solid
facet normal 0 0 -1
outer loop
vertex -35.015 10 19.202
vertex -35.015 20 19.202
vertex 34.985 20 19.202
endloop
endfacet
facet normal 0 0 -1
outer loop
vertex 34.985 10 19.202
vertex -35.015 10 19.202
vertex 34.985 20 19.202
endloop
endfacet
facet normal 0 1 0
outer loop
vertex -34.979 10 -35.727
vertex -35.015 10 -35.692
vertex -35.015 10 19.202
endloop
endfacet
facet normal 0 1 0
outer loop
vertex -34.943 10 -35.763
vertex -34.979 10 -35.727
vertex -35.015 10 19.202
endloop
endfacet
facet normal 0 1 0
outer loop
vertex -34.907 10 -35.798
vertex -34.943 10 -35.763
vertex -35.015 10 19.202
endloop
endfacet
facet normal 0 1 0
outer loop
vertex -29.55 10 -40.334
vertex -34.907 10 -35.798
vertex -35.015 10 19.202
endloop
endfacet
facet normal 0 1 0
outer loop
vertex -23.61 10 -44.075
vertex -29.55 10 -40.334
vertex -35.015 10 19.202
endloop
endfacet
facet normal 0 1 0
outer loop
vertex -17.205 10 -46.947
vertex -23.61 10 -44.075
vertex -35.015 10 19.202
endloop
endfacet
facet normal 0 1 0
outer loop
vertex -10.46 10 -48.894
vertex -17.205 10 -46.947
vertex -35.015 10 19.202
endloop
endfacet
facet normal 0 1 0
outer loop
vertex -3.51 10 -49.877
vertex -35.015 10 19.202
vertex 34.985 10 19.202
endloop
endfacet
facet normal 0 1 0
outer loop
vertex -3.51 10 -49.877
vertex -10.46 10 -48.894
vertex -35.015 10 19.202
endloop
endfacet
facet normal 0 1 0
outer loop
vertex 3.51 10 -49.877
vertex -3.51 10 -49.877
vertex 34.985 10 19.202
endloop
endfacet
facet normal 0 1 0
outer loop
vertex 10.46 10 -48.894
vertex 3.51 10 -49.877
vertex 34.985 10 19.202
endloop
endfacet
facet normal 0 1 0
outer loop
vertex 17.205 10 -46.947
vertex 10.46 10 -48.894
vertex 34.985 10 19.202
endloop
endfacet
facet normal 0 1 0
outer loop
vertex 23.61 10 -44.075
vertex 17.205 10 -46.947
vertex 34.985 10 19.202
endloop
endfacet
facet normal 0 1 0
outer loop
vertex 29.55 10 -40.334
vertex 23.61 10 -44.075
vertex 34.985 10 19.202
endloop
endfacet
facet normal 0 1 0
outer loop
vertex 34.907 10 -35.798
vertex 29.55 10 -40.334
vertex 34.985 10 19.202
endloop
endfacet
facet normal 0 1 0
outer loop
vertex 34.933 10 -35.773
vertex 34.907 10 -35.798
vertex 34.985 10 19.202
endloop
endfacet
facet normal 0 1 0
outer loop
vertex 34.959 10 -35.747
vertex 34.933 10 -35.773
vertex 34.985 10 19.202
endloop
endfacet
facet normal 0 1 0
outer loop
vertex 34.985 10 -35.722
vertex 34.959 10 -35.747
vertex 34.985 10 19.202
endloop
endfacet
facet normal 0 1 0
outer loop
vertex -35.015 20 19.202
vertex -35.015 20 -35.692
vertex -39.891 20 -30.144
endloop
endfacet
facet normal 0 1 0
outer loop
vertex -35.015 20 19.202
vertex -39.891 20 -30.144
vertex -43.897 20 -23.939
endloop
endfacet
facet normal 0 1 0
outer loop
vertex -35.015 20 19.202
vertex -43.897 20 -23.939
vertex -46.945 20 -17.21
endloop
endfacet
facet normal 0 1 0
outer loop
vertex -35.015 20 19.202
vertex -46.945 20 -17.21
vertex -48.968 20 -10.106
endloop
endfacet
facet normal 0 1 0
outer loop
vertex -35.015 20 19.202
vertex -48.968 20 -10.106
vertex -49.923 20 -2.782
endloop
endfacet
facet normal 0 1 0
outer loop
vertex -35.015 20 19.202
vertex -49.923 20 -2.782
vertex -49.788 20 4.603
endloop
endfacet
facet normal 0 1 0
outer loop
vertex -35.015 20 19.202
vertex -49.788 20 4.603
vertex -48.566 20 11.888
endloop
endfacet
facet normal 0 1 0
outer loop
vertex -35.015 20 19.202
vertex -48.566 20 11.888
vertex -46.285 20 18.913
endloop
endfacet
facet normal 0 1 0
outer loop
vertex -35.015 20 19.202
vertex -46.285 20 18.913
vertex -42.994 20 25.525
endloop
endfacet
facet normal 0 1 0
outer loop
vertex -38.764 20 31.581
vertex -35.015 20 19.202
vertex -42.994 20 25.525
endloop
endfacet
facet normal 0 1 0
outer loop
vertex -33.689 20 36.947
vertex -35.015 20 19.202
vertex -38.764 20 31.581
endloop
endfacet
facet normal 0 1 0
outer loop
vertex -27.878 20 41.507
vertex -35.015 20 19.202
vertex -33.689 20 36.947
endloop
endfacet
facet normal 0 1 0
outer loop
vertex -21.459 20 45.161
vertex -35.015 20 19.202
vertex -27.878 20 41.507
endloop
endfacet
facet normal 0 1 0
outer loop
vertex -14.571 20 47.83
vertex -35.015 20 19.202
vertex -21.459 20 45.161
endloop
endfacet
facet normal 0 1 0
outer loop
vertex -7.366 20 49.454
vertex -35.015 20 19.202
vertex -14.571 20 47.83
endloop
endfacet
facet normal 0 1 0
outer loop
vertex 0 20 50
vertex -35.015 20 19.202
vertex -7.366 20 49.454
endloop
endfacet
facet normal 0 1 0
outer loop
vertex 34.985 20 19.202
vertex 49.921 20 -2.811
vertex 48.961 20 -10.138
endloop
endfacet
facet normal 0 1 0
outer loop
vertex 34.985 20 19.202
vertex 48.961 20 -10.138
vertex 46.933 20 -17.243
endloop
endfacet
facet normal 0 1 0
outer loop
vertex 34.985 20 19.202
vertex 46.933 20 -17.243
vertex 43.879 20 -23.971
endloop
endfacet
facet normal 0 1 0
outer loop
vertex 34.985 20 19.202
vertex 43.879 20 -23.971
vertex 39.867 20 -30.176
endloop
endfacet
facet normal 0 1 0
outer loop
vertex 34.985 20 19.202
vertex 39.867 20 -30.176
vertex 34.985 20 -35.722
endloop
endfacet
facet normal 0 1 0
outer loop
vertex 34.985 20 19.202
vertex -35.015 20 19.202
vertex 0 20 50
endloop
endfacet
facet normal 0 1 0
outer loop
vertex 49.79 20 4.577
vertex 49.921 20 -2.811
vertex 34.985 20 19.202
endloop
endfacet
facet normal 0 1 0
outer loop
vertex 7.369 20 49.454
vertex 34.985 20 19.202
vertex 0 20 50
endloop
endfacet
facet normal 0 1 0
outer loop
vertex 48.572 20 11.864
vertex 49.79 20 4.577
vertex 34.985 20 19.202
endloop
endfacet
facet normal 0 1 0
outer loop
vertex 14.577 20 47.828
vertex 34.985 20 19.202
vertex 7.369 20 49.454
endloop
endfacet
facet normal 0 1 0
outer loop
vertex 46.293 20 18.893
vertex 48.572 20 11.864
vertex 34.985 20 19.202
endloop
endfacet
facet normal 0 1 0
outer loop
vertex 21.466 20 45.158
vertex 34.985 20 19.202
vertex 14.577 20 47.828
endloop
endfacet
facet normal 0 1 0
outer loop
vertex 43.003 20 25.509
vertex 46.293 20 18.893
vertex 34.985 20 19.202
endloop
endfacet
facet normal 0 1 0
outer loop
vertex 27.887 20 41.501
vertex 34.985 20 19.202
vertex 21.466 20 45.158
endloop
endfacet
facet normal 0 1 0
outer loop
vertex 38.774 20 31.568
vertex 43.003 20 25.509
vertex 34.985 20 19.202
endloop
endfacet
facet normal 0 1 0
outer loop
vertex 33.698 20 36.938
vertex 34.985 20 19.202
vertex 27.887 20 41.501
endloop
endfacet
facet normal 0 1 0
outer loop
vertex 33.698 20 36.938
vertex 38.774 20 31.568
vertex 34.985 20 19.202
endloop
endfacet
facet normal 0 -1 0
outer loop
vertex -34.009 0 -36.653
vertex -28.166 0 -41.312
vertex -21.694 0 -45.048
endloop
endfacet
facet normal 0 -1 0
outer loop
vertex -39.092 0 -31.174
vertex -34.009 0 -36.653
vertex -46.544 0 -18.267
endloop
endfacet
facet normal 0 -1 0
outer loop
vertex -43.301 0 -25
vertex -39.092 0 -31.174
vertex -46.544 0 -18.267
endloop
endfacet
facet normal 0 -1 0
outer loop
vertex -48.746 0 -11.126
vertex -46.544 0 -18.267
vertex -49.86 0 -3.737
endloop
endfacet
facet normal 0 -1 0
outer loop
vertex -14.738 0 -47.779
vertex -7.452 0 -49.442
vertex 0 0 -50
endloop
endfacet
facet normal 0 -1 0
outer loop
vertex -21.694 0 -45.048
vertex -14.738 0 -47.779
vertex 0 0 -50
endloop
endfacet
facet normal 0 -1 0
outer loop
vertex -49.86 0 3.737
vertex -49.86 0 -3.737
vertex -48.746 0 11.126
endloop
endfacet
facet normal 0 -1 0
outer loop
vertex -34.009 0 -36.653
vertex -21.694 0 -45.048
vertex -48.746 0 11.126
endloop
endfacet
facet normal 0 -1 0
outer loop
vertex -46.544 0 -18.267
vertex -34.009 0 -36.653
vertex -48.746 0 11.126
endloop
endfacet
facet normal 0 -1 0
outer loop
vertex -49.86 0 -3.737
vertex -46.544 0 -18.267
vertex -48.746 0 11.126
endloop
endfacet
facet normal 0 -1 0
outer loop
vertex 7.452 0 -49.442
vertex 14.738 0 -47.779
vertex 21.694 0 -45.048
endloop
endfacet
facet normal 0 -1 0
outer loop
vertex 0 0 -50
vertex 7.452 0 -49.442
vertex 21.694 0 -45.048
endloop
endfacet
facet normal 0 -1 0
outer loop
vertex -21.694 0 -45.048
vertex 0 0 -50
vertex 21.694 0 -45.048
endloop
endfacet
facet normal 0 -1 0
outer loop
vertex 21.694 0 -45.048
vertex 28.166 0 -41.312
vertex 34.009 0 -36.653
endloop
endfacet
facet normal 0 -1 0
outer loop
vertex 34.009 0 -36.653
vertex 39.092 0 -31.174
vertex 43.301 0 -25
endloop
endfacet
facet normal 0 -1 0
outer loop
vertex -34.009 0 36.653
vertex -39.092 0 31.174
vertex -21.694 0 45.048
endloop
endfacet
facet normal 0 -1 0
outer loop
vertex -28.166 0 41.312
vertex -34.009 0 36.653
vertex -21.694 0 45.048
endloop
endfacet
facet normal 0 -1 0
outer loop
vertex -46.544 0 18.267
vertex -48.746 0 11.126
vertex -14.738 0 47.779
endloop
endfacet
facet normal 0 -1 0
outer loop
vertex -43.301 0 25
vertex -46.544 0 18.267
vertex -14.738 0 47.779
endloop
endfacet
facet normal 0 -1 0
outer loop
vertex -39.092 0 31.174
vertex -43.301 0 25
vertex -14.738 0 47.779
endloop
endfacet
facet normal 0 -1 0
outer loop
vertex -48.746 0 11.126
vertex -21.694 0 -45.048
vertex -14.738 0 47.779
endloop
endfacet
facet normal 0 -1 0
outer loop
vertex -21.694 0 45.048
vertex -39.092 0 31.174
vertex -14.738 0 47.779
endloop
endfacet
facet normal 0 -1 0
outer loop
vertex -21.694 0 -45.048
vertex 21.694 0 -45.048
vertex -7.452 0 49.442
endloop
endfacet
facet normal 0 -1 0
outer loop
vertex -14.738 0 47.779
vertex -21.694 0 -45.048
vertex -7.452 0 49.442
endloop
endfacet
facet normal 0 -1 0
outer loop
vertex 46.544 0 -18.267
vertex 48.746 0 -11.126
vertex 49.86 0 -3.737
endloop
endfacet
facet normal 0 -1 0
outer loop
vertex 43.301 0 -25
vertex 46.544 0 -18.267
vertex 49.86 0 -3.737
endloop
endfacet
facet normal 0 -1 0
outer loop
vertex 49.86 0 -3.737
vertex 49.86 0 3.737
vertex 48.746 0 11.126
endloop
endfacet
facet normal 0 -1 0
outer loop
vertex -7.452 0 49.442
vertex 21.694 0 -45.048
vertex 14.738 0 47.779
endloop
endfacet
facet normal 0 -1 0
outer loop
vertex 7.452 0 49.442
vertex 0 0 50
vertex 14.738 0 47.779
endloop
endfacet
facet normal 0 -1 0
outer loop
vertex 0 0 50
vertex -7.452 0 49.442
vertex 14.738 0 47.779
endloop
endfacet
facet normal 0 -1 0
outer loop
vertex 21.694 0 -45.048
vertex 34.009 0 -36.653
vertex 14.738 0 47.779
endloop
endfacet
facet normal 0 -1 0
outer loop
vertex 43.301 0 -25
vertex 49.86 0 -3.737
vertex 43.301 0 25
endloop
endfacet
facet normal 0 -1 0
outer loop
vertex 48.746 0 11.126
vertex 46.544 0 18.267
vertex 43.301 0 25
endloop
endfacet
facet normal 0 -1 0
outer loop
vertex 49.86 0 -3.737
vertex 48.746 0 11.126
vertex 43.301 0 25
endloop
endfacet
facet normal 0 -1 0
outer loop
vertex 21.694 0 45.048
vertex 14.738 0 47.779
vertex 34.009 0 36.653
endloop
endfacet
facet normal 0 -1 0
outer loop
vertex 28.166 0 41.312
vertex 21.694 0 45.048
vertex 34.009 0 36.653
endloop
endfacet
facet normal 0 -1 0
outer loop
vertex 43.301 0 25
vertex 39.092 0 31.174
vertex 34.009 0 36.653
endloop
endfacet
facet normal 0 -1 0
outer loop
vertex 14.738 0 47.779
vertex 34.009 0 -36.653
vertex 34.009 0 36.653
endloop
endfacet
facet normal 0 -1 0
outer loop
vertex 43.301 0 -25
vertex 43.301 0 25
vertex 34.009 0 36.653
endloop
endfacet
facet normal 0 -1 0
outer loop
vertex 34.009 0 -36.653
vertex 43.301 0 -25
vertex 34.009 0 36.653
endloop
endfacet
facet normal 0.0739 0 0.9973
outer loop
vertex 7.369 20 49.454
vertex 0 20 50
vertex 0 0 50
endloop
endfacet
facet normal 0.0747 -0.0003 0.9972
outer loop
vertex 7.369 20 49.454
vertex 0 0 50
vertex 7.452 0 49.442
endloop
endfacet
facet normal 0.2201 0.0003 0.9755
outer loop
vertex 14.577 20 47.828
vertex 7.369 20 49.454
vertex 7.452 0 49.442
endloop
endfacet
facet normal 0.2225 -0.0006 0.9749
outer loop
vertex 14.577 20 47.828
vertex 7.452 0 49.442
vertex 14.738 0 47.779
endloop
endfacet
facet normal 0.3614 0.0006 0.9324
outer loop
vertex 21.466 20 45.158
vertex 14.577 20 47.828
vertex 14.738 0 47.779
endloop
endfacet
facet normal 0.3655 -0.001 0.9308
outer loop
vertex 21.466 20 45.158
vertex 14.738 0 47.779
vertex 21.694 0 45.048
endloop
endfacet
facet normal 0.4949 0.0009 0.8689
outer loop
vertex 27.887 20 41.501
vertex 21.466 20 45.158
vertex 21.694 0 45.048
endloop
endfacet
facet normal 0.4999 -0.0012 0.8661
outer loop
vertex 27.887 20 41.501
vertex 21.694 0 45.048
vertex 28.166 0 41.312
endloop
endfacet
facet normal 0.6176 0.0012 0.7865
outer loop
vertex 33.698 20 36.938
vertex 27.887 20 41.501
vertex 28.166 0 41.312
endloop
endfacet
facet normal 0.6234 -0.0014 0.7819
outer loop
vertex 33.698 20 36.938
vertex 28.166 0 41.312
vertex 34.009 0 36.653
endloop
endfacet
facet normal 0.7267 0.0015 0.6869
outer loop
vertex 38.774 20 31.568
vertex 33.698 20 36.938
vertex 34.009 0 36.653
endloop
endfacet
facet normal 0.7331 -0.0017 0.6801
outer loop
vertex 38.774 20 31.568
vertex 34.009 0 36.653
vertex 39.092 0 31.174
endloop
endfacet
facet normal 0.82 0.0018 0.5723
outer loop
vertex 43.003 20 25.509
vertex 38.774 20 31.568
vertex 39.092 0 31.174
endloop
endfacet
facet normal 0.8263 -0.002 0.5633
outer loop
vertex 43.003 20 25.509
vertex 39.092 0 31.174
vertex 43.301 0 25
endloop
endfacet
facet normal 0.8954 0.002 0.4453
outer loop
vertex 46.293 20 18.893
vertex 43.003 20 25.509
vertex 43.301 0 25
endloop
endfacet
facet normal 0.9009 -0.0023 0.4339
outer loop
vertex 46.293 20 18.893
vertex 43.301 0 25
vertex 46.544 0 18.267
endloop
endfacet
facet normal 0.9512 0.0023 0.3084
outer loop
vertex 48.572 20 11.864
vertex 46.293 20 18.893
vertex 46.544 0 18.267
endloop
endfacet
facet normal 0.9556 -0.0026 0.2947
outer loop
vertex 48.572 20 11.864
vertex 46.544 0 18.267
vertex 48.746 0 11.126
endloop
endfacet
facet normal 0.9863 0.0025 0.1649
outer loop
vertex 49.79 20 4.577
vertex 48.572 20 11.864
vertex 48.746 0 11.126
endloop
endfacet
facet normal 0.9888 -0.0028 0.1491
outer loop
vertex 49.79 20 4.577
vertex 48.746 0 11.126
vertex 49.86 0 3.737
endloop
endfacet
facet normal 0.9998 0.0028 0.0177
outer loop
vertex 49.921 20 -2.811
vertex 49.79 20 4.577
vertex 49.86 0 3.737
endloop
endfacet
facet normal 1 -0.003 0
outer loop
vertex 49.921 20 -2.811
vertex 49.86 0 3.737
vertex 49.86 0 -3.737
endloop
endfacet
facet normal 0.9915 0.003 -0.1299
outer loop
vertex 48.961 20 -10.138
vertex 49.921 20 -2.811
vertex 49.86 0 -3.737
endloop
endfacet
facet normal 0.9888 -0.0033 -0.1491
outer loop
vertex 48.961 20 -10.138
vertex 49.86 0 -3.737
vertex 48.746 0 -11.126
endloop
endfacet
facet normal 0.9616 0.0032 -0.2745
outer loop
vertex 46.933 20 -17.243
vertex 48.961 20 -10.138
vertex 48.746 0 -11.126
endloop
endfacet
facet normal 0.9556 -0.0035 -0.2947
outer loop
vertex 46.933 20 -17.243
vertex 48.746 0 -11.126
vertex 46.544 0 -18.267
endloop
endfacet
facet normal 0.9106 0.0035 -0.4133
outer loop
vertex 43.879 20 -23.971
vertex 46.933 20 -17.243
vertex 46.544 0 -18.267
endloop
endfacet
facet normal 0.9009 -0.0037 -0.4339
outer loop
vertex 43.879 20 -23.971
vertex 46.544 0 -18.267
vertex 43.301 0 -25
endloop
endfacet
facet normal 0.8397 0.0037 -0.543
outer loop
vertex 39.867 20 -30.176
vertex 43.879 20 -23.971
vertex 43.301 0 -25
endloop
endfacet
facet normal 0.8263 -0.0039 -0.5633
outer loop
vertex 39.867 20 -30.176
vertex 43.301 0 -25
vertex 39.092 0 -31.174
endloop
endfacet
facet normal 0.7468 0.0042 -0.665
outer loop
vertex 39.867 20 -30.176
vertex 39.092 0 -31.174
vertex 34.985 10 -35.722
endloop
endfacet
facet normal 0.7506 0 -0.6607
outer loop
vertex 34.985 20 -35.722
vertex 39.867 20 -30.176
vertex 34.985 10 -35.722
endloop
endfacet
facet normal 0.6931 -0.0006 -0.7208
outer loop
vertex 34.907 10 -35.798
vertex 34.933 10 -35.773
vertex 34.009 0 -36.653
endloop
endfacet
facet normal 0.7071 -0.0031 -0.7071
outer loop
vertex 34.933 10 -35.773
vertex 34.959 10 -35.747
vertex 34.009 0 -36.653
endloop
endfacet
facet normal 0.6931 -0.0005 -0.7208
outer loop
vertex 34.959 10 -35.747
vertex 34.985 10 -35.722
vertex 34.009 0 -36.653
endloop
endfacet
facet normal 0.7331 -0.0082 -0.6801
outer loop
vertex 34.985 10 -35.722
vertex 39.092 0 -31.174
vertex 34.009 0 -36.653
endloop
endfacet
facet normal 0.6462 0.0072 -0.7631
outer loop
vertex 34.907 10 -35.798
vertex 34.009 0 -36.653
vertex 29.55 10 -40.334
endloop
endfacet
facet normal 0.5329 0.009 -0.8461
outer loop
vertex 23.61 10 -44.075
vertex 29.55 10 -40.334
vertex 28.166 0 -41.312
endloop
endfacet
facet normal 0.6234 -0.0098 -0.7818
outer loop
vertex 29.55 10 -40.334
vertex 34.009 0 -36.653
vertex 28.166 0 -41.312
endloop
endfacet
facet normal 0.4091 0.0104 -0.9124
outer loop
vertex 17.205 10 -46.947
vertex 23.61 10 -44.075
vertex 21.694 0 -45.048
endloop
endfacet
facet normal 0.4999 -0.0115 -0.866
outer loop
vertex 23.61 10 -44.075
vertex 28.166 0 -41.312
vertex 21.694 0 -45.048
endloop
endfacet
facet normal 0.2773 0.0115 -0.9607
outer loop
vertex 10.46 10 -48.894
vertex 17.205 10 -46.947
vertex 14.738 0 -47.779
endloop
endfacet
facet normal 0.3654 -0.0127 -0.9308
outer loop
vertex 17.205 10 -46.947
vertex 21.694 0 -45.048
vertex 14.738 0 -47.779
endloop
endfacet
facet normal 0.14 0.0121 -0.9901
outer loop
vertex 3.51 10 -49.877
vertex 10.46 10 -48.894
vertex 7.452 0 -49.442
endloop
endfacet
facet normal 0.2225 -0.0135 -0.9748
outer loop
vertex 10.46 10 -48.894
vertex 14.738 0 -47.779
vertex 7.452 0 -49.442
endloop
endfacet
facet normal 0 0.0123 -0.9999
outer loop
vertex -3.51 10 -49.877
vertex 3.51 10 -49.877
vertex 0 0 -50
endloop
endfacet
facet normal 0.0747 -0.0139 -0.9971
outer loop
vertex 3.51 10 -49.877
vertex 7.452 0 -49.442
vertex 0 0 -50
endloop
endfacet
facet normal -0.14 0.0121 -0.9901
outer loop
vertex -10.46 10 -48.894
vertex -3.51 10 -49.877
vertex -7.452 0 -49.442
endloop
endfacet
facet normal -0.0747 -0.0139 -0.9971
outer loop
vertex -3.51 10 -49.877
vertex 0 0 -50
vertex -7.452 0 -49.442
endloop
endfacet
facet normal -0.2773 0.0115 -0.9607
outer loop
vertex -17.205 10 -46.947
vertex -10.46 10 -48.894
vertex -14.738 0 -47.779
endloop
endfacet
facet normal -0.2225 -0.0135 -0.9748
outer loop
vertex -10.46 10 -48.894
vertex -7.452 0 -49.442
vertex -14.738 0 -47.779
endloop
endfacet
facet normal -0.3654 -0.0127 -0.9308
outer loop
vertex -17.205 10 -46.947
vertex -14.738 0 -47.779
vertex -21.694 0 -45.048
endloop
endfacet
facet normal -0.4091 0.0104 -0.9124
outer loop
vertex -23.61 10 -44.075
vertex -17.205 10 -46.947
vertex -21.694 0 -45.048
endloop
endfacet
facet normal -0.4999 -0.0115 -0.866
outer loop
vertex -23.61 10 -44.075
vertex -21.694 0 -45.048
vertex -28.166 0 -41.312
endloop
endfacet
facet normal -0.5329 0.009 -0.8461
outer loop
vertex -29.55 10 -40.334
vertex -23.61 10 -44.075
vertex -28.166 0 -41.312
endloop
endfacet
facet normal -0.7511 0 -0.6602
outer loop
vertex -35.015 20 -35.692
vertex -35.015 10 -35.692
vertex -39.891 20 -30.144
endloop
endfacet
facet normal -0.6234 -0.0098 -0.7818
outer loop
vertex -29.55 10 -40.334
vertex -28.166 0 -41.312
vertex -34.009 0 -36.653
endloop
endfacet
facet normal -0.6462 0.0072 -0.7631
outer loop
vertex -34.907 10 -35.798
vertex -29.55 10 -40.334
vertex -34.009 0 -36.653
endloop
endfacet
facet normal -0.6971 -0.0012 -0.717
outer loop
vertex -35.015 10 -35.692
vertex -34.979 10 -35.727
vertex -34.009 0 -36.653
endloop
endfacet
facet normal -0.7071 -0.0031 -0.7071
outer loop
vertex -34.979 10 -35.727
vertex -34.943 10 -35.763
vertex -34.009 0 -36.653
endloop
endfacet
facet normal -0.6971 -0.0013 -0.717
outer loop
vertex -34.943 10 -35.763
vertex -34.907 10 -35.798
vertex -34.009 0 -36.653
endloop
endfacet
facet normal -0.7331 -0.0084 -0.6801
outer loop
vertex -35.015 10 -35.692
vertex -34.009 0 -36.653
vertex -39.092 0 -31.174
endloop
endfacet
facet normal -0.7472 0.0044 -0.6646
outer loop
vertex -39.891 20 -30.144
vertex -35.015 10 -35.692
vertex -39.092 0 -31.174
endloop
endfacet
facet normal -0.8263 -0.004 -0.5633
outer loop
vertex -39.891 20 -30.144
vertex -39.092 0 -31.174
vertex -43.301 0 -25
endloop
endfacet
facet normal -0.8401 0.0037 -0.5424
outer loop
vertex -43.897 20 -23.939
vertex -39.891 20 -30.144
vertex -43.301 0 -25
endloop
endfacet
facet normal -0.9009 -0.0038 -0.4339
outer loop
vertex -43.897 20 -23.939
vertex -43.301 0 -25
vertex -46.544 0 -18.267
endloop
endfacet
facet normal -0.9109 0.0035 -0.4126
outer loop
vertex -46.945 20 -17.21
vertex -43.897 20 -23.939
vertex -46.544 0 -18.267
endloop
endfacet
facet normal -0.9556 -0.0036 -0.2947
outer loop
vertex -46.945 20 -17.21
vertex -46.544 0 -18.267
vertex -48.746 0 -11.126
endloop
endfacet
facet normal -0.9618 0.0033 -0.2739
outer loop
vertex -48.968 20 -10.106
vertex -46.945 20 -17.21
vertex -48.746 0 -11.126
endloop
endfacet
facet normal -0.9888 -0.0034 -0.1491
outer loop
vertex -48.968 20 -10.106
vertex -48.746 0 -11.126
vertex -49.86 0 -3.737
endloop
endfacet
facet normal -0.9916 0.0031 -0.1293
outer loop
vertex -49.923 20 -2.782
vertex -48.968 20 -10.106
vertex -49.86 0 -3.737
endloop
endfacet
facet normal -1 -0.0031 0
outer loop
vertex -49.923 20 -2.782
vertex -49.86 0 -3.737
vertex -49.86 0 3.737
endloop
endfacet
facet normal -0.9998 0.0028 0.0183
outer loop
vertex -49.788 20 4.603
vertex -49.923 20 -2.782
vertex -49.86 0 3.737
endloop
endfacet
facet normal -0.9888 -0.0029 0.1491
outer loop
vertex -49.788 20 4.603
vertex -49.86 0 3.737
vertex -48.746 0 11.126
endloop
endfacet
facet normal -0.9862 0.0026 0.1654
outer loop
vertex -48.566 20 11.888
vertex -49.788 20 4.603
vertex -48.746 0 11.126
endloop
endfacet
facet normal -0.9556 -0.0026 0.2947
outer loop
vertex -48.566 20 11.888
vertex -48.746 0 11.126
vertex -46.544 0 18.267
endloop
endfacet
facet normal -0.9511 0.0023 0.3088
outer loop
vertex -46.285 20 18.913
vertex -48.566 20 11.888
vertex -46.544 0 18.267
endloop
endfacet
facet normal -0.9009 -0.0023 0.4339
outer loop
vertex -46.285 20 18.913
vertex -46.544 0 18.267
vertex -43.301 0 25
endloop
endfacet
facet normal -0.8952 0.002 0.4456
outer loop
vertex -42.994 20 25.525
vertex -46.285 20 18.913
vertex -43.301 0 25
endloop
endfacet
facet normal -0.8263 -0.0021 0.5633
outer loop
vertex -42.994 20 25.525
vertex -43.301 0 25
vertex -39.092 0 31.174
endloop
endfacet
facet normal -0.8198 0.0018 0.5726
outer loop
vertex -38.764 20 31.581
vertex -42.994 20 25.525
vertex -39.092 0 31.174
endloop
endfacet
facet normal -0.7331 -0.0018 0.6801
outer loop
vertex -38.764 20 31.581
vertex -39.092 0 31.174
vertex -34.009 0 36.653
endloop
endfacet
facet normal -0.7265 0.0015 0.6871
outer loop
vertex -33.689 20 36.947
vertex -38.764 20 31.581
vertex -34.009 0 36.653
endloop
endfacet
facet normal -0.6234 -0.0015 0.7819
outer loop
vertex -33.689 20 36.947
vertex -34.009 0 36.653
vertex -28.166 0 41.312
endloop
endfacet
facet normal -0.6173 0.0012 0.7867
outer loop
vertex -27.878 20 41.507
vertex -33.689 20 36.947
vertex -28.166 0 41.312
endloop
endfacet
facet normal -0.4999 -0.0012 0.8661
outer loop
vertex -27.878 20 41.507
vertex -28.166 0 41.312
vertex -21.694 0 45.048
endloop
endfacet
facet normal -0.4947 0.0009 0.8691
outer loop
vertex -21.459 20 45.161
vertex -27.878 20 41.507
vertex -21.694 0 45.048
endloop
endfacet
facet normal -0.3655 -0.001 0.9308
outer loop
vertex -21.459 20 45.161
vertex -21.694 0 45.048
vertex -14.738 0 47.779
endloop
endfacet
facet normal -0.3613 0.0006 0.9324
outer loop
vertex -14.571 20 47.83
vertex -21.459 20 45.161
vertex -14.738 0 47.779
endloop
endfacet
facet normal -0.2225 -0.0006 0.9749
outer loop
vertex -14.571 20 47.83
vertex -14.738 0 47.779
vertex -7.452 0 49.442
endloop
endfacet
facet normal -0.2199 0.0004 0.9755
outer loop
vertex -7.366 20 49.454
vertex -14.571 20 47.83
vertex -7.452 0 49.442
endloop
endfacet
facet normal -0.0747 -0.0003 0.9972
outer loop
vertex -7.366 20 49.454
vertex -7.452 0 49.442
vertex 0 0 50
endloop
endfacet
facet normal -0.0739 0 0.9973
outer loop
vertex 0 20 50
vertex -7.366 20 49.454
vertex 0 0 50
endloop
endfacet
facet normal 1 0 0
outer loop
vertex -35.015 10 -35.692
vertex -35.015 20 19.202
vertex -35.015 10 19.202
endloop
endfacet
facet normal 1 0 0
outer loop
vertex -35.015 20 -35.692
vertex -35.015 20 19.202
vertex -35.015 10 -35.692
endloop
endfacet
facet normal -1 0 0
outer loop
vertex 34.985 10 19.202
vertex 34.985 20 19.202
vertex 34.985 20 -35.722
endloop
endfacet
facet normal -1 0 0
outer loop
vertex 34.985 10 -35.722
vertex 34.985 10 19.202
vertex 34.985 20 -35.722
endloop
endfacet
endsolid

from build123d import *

# Parameters (mm, degrees)
SKETCH1_R           = 50
BOSS_EXTRUDE1_DEPTH = 20
SKETCH2_W           = 70
SKETCH2_H           = 55
CUT_EXTRUDE1_DEPTH  = 10
CUT_EXTRUDE3_START  = -10
CUT_EXTRUDE3_DEPTH  = 10


with BuildPart() as part:
    # Sketch1 → Boss-Extrude1 (new body)
    with BuildSketch(Plane(origin=(0, 0, 0), x_dir=(1, 0, 0), z_dir=(0, 1, 0))):
        with Locations(Location((0, 0, 0), (0, 0, 270))):
            Circle(SKETCH1_R)
    extrude(amount=BOSS_EXTRUDE1_DEPTH)

    # Sketch2 → Cut-Extrude1 (cut)
    with BuildSketch(Plane(origin=(0, 20, 0), x_dir=(1, 0, 0), z_dir=(0, 1, 0))):
        with Locations((-0.015145616, 8.297810168)):
            Rectangle(SKETCH2_W, SKETCH2_H)
    extrude(amount=-CUT_EXTRUDE1_DEPTH, mode=Mode.SUBTRACT)

    # Sketch3 → Cut-Extrude3 (cut)
    with BuildSketch(Plane(origin=(0, 20, 0), x_dir=(1, 0, 0), z_dir=(0, 1, 0)).offset(CUT_EXTRUDE3_START)):
        with BuildLine():
            Line((-35.015145616, 35.692290169), (34.984854384, 35.72198152))
            ThreePointArc((34.984854384, 35.72198152), (-0.021208106, 49.999995502), (-35.015145616, 35.692290169))
        make_face()
    extrude(amount=CUT_EXTRUDE3_DEPTH, mode=Mode.SUBTRACT)


solid = part.part
